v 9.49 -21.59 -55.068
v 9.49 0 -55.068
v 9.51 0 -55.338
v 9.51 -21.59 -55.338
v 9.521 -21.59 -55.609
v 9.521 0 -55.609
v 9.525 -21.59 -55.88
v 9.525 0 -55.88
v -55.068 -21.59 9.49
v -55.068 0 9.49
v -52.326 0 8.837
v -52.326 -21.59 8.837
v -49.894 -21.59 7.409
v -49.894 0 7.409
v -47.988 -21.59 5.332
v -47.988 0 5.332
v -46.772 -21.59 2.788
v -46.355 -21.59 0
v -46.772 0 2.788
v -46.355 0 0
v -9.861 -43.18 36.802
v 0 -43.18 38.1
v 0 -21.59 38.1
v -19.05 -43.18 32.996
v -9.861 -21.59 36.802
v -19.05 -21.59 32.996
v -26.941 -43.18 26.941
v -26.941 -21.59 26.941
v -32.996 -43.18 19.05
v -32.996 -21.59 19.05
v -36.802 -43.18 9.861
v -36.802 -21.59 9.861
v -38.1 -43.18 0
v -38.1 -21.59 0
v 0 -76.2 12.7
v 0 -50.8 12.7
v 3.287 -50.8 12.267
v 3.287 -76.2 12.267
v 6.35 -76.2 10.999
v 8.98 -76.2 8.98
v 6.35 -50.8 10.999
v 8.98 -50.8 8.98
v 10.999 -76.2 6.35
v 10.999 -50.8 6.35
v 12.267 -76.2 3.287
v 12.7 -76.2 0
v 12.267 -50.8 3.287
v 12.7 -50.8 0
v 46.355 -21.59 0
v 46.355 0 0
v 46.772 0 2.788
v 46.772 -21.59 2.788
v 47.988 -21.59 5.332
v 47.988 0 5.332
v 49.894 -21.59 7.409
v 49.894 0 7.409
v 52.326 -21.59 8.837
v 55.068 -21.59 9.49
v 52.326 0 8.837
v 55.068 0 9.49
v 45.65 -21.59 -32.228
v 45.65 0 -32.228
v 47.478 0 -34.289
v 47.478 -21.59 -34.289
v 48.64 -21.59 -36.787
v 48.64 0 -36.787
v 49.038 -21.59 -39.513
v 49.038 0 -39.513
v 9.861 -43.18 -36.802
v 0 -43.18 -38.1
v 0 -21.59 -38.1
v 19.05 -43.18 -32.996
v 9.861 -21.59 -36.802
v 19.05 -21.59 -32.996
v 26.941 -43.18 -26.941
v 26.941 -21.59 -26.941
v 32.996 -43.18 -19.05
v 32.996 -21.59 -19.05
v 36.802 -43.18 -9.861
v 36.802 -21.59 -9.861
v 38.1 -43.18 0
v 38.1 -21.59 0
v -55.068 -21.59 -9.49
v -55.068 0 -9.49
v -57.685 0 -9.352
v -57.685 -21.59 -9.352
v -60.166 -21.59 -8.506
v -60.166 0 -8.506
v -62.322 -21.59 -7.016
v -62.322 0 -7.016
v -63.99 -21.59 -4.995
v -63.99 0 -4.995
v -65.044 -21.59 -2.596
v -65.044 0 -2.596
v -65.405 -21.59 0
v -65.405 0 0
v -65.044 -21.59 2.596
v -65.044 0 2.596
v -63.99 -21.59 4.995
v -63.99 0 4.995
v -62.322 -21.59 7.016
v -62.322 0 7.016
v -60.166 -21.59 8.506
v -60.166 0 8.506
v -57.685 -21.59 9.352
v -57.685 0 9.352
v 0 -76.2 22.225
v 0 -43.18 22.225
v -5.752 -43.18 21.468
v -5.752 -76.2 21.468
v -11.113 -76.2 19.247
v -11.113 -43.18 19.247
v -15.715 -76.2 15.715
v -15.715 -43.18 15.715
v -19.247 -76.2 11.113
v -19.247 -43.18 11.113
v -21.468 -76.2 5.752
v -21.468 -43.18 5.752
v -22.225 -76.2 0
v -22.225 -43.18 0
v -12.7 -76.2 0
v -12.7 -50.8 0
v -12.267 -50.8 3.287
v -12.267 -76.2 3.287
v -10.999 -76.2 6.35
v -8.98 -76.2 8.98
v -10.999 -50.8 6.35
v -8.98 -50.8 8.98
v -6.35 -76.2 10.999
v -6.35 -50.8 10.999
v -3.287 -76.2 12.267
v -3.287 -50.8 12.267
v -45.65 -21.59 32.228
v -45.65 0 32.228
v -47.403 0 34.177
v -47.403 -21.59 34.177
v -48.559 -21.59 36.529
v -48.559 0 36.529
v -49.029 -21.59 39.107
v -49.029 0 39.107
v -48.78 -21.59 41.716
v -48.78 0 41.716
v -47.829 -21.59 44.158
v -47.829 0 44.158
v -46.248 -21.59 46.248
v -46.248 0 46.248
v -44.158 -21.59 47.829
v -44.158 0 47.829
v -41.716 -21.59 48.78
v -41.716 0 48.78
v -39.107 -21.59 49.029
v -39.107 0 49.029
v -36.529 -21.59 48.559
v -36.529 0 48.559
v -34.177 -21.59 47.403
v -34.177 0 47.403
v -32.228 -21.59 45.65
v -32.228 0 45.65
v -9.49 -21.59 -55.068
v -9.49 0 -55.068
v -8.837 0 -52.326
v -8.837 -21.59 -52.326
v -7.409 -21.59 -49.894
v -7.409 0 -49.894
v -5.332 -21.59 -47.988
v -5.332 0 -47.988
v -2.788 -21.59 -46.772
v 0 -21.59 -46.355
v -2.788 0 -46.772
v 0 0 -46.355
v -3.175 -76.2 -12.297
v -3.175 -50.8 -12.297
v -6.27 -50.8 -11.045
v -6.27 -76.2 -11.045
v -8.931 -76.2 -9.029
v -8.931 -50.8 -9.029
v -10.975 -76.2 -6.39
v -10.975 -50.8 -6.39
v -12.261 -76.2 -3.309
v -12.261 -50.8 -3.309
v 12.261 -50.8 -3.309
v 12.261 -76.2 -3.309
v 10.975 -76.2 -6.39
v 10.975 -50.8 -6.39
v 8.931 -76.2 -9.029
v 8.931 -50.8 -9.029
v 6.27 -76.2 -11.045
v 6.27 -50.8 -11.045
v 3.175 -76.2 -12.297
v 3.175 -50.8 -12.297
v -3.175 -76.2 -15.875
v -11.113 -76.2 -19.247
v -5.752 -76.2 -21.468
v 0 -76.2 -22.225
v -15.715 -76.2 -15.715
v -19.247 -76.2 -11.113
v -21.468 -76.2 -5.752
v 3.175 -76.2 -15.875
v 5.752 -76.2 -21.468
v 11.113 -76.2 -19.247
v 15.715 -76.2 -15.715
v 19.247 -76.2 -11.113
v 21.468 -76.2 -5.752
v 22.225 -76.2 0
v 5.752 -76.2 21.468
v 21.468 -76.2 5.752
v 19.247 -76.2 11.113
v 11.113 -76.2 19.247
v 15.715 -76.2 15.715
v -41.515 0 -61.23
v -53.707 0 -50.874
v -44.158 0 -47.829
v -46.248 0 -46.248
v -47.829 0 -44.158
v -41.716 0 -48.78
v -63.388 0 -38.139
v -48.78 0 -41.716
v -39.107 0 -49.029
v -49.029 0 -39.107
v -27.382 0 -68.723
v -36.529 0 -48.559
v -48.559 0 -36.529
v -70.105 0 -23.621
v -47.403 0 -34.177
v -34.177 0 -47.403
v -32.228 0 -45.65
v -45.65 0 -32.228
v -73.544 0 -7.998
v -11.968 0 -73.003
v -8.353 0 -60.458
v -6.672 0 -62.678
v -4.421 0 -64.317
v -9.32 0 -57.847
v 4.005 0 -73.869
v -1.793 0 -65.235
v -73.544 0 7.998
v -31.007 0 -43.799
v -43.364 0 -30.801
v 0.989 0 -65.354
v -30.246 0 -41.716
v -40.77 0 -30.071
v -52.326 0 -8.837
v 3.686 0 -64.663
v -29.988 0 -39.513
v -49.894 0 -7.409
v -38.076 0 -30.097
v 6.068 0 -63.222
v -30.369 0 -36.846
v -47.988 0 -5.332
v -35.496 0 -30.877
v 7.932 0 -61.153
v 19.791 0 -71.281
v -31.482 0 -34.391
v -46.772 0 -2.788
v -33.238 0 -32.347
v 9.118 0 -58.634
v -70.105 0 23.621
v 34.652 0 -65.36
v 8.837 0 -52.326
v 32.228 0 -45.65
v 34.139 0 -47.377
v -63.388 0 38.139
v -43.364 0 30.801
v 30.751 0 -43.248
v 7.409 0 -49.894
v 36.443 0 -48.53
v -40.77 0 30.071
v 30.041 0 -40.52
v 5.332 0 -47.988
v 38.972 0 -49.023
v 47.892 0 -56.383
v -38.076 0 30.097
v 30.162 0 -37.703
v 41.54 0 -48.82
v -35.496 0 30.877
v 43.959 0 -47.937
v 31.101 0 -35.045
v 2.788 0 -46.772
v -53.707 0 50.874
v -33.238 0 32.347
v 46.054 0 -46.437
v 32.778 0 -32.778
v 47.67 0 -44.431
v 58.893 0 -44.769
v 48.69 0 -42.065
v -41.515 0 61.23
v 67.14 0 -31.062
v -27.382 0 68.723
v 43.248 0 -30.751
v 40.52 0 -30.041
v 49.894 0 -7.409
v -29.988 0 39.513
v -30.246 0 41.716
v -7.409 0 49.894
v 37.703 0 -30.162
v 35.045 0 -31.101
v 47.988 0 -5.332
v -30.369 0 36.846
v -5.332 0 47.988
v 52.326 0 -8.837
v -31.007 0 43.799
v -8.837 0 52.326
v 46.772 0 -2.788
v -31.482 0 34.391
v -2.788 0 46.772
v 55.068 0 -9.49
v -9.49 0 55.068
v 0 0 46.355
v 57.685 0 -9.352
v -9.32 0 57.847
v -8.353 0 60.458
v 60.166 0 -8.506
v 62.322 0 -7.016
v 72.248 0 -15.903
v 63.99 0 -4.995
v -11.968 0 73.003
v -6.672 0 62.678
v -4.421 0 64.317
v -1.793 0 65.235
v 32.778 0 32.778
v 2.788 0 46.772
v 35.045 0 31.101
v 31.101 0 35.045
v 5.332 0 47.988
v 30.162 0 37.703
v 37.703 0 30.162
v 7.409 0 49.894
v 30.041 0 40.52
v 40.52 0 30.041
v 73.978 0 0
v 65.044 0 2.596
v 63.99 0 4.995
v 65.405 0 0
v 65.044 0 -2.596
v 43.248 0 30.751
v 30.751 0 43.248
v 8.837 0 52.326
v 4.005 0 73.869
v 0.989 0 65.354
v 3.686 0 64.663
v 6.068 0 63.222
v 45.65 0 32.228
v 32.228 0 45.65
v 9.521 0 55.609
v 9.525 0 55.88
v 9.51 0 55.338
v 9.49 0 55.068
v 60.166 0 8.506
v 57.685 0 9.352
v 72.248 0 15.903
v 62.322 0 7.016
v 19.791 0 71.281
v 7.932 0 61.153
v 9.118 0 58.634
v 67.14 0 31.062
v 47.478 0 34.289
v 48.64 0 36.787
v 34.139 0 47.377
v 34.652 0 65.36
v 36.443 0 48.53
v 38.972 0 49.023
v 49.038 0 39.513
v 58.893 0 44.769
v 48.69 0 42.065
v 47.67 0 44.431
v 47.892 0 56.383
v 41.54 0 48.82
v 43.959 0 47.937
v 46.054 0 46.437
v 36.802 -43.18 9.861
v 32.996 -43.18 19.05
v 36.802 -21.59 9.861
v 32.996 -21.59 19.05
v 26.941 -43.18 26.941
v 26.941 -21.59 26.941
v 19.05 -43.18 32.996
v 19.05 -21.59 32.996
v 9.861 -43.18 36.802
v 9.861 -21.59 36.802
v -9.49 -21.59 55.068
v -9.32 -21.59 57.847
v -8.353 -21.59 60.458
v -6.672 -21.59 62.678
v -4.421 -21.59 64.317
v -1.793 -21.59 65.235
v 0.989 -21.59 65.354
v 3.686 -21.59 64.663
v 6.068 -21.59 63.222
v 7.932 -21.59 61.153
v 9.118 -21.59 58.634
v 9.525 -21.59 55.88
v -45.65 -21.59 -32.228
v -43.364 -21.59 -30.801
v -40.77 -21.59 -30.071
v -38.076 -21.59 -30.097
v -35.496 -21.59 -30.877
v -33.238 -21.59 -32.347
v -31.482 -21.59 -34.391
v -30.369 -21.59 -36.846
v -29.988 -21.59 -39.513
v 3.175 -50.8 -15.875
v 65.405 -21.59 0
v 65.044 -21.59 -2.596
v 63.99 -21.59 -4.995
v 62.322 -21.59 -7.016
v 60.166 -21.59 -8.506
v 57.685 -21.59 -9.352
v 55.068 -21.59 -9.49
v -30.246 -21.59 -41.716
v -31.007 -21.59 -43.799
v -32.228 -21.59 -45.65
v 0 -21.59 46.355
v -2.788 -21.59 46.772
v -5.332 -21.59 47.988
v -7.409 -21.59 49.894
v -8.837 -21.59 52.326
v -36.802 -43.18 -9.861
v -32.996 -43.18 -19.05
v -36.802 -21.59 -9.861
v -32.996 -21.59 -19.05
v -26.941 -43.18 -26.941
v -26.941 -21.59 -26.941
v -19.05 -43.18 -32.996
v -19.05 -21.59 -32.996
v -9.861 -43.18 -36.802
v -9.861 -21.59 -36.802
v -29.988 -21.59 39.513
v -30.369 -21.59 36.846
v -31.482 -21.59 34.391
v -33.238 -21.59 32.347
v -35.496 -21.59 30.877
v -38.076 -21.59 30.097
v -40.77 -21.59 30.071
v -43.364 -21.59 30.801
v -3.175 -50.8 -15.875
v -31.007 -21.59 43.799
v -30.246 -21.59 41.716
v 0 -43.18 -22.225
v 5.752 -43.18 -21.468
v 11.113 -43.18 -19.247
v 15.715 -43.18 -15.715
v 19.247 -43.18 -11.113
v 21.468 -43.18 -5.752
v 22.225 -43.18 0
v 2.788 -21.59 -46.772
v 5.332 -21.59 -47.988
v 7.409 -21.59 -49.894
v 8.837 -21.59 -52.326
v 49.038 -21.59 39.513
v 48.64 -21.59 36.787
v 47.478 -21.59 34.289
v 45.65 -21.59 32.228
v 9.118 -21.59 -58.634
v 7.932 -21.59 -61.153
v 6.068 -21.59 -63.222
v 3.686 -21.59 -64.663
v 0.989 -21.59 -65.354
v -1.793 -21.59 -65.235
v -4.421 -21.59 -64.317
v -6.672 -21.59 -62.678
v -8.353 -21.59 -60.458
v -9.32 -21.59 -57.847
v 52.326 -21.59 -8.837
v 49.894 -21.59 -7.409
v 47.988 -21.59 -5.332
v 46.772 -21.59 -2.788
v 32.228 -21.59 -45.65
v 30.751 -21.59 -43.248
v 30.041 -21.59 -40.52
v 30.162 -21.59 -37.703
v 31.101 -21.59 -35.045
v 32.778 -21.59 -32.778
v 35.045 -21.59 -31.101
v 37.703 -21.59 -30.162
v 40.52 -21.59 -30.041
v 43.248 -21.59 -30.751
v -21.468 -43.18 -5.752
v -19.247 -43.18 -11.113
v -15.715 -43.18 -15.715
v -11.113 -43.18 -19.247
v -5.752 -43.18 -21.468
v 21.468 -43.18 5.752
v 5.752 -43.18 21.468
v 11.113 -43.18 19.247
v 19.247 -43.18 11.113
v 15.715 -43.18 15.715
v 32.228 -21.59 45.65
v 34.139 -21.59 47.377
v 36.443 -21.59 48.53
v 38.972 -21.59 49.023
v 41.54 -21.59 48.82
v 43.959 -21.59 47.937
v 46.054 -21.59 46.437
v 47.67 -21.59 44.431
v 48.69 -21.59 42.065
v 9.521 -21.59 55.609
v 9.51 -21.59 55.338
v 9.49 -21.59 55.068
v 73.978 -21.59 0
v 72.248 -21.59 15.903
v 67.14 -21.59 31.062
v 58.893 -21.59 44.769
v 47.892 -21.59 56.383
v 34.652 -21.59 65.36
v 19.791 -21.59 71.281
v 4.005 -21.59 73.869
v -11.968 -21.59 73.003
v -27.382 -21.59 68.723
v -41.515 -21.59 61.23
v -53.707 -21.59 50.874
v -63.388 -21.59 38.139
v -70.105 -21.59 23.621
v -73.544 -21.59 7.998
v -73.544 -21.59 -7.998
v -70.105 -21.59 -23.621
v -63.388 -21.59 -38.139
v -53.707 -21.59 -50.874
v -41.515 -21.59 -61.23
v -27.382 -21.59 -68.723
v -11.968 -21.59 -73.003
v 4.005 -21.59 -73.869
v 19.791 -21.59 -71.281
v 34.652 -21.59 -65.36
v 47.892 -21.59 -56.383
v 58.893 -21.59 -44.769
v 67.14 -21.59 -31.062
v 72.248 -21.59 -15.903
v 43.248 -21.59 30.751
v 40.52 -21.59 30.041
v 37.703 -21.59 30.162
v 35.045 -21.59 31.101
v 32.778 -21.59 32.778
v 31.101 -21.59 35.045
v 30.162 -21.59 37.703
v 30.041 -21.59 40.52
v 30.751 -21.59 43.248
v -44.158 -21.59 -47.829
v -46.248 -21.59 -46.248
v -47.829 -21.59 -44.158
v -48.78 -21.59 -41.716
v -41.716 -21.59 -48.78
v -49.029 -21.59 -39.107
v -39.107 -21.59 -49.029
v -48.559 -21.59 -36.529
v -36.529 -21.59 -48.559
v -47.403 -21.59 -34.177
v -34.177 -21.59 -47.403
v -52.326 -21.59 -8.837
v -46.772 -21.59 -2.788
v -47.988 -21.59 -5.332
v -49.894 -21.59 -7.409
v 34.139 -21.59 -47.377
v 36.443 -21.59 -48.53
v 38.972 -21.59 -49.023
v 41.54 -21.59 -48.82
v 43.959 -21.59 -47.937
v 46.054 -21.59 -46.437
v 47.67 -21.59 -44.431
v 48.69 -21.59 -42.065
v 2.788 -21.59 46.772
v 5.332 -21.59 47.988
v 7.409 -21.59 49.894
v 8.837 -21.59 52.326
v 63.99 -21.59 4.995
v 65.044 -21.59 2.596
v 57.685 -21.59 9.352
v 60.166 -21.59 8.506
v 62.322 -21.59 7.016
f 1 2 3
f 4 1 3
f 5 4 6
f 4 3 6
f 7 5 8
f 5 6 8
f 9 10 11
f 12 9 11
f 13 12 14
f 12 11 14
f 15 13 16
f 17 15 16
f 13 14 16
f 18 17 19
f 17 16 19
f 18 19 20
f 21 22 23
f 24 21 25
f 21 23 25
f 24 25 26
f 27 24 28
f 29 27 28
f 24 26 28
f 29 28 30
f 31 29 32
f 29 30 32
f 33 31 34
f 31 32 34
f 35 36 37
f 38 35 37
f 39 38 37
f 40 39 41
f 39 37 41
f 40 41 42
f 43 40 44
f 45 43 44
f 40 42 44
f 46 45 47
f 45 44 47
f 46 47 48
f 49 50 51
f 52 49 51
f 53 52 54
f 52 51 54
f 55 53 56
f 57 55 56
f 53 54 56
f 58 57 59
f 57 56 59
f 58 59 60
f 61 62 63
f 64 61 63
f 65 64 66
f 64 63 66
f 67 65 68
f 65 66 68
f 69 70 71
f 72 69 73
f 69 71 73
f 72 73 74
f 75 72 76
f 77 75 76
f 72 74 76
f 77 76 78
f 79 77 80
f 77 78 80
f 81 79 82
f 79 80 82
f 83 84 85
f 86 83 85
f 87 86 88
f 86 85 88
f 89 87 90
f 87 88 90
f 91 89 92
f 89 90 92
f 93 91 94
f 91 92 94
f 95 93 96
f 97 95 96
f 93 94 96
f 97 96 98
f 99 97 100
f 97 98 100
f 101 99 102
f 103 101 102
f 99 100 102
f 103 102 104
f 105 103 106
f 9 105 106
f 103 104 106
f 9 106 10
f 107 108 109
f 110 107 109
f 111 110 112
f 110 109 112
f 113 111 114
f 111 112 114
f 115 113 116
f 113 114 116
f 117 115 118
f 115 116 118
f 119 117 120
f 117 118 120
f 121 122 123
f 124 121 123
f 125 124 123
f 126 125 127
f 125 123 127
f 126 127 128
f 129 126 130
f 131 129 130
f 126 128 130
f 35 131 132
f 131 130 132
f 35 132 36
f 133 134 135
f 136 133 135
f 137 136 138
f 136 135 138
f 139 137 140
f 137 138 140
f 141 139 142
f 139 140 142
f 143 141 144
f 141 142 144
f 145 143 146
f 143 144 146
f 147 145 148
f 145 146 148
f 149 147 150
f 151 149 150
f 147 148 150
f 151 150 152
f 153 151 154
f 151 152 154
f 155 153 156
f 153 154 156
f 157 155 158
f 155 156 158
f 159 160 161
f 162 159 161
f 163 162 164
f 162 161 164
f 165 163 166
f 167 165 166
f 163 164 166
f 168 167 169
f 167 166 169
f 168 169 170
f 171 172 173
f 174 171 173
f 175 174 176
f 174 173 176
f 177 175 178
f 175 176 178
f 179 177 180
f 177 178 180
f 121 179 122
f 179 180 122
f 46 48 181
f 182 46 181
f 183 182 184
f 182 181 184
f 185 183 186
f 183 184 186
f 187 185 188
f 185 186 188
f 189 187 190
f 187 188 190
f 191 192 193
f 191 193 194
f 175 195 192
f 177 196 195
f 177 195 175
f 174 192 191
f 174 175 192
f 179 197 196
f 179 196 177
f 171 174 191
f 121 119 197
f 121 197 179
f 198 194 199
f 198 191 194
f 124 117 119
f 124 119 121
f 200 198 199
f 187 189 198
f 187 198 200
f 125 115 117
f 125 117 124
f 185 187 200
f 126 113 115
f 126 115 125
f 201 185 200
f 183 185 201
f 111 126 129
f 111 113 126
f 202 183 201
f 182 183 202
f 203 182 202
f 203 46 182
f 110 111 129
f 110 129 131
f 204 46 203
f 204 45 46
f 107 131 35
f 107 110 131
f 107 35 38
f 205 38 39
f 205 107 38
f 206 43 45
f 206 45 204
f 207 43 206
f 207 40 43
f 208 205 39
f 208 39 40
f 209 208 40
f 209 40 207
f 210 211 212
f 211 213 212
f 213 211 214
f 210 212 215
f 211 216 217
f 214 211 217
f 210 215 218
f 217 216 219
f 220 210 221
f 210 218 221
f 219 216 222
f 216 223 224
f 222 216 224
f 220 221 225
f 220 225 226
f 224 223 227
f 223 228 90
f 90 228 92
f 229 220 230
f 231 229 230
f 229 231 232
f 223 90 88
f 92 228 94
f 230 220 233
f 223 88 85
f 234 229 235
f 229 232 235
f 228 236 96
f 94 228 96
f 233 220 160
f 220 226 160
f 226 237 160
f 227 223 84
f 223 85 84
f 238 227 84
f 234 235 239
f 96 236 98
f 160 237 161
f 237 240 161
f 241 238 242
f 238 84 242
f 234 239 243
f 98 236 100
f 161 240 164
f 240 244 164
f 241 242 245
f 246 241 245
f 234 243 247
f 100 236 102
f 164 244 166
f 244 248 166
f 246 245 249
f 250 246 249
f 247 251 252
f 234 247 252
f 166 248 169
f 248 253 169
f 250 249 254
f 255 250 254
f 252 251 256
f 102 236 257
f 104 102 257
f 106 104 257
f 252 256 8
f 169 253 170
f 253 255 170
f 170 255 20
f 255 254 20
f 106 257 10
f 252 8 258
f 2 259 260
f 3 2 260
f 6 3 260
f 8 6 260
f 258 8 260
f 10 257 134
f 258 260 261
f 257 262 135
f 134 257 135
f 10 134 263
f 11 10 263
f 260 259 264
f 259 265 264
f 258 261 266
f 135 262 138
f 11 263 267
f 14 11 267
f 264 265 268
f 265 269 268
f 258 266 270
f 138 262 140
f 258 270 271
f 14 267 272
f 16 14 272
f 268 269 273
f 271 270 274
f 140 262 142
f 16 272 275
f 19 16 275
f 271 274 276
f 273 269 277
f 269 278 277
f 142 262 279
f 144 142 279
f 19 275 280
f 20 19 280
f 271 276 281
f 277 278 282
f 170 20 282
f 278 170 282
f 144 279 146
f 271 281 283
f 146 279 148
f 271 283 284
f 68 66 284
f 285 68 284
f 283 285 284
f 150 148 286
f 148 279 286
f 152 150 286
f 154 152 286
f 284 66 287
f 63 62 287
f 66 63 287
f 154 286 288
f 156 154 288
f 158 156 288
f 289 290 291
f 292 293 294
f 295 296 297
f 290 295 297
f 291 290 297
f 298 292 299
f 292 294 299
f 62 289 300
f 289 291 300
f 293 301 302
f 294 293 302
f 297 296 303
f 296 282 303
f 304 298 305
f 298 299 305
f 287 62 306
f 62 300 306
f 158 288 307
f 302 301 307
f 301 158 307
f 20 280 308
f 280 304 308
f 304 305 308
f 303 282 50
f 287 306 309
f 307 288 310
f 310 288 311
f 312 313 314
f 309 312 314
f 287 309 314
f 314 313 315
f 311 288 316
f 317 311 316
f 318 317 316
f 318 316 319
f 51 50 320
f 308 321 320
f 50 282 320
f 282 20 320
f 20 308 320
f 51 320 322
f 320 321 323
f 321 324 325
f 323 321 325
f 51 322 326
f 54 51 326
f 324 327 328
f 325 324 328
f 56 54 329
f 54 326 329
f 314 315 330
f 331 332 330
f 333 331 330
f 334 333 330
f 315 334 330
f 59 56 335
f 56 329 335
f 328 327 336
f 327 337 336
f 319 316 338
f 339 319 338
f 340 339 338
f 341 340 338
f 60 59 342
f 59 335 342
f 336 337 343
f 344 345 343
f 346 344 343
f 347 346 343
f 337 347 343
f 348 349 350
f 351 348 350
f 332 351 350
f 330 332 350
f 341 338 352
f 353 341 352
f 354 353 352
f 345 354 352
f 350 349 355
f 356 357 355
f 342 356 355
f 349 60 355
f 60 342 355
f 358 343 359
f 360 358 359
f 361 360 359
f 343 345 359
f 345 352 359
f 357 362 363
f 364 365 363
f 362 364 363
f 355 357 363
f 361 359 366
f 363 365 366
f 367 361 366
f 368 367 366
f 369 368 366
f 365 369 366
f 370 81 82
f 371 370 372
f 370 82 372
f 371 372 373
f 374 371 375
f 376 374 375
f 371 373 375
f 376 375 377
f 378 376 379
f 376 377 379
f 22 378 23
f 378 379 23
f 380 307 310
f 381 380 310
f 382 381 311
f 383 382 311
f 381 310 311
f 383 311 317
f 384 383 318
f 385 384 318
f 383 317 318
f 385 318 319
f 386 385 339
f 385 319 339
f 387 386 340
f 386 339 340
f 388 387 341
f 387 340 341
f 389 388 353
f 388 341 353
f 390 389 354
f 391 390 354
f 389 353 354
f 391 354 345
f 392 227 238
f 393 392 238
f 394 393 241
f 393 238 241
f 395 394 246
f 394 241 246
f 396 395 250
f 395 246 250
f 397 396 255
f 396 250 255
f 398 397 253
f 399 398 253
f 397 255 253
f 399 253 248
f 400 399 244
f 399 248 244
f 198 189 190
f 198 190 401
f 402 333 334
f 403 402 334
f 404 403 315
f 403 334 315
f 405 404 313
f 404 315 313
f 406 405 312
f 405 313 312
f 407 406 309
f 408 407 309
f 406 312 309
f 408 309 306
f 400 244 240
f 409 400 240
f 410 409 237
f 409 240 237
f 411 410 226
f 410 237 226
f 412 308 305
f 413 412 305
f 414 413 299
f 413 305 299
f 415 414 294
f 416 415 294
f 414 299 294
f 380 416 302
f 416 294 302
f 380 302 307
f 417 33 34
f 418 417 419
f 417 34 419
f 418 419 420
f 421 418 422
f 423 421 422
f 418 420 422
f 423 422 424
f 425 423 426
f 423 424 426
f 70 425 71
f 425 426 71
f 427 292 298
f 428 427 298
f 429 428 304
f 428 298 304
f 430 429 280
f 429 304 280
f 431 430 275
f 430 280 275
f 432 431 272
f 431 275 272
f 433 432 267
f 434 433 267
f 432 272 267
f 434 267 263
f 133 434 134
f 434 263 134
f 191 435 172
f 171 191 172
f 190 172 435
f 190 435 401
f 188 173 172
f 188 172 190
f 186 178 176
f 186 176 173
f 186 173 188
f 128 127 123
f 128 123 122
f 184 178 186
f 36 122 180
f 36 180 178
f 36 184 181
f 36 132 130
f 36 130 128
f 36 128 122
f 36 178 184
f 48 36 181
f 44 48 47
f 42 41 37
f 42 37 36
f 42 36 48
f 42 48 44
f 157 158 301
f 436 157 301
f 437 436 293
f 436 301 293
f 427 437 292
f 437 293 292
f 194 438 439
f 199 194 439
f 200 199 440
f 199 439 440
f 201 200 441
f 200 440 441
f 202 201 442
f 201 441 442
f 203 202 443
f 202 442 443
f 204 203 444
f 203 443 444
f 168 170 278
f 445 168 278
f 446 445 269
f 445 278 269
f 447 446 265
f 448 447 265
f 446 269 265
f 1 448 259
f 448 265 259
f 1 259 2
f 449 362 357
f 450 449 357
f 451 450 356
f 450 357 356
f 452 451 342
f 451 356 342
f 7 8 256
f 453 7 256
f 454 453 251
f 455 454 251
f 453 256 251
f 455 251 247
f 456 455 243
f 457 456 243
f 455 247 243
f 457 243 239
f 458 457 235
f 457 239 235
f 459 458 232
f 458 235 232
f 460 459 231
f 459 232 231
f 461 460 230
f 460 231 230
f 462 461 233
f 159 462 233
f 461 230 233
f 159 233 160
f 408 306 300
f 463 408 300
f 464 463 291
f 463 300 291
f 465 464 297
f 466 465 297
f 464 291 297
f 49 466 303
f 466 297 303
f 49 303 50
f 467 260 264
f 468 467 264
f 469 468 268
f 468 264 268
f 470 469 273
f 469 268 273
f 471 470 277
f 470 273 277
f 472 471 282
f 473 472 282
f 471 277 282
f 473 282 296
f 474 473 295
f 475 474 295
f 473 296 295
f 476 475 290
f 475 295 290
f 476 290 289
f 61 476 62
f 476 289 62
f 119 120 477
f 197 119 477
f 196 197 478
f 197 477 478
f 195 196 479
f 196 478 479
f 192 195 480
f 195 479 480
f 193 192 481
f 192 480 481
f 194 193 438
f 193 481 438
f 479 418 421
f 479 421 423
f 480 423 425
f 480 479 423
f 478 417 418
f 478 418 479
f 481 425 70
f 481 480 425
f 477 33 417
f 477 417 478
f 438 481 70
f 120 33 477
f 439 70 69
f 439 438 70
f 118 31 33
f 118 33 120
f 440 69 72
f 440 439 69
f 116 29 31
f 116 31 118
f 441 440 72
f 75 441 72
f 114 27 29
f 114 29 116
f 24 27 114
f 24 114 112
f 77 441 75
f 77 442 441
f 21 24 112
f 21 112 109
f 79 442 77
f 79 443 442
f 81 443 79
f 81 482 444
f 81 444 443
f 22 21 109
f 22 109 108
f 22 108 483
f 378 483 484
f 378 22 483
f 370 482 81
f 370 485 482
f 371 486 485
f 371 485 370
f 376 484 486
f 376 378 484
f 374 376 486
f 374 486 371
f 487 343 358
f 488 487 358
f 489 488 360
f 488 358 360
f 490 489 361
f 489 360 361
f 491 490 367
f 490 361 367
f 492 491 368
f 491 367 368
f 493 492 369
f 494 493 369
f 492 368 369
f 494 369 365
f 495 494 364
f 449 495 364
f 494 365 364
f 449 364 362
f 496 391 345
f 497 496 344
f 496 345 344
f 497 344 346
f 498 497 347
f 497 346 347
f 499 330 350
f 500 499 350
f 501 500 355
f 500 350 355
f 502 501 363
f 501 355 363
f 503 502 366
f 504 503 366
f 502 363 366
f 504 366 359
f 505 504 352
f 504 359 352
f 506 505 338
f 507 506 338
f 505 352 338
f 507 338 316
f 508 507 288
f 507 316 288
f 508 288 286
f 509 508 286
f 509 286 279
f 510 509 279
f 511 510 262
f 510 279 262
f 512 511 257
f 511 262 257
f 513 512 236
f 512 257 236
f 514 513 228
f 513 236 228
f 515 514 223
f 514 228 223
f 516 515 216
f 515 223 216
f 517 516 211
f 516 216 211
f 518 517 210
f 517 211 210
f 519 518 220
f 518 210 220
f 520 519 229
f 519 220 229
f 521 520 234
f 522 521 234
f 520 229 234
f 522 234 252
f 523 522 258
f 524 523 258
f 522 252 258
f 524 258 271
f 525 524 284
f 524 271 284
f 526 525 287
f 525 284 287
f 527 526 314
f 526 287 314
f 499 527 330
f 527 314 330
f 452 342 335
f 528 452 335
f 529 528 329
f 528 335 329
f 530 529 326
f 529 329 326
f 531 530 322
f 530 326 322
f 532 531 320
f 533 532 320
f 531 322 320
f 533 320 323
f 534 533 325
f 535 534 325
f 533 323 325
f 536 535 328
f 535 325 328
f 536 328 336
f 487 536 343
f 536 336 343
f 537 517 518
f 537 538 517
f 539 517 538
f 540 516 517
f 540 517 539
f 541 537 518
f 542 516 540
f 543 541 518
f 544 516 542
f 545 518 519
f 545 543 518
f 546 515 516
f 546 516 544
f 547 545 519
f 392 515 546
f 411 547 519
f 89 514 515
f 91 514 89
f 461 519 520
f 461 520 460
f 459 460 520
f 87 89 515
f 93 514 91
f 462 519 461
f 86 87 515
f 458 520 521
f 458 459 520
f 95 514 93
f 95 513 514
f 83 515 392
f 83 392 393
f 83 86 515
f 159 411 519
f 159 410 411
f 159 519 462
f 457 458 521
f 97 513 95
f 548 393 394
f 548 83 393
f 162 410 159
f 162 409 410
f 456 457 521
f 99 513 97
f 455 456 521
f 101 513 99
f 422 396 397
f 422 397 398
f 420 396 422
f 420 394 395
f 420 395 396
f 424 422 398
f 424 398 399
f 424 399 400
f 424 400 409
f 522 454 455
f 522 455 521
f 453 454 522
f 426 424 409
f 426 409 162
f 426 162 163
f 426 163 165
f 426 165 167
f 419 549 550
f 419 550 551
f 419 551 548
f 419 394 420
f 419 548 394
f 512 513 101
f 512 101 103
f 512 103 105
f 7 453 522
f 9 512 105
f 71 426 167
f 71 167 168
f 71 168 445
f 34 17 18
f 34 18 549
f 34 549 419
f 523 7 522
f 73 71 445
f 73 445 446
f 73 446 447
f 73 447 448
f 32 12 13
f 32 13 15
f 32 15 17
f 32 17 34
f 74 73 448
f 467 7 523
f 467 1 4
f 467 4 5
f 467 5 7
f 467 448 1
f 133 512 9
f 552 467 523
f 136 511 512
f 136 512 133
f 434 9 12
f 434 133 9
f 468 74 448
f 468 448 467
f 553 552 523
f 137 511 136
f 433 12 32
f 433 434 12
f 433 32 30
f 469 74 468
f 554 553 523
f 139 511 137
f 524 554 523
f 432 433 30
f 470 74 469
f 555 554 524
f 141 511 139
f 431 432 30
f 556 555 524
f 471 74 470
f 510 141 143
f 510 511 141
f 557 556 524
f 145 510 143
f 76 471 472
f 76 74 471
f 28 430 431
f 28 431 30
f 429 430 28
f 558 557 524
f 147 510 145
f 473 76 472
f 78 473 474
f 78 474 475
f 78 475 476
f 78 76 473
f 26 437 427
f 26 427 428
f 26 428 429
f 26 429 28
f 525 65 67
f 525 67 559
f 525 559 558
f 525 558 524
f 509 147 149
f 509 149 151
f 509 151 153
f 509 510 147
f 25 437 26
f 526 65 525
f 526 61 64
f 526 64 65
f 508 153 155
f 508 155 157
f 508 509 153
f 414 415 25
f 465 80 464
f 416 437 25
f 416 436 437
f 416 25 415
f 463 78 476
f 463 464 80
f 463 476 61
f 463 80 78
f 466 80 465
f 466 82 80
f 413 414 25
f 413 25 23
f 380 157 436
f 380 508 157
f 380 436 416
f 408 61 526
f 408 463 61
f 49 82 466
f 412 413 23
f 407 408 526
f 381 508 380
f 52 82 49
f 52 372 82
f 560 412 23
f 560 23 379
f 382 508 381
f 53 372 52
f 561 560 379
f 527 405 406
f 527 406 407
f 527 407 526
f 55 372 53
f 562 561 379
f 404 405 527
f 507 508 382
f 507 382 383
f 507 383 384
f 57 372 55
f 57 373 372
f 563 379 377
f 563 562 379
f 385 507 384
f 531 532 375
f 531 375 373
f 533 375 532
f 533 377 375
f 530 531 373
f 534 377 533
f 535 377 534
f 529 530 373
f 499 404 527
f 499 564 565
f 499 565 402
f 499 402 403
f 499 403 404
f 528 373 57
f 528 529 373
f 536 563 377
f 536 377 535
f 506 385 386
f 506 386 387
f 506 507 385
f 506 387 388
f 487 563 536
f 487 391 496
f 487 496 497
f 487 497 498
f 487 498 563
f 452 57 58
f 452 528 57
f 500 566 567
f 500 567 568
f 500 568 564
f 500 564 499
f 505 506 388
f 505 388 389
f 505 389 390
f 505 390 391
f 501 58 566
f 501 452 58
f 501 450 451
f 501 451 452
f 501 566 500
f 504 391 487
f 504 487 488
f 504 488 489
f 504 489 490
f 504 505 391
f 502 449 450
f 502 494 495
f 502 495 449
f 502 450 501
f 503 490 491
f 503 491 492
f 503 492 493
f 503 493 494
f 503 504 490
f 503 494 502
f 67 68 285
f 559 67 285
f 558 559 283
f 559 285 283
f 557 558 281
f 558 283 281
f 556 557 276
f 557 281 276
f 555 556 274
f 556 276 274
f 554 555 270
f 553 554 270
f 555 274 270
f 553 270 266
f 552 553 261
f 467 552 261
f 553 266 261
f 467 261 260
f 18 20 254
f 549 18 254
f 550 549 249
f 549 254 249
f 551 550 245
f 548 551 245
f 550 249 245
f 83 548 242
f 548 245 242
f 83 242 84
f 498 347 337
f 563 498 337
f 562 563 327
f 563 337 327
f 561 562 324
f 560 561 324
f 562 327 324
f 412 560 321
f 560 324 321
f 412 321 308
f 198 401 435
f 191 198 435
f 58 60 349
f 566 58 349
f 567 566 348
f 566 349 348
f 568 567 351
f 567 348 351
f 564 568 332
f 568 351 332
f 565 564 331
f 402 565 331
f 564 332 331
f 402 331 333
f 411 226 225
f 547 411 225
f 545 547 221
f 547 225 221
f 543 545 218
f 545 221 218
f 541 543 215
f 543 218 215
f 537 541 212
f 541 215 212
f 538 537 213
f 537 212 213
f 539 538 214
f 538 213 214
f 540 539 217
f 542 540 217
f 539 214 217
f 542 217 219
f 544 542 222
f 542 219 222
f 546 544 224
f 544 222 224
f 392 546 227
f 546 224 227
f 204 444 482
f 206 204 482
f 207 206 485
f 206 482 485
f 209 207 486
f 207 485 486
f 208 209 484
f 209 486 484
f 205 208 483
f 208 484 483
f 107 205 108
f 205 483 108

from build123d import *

# Parameters (mm, degrees)
F0_R     = 73.9775
F1_DEPTH = 21.59
F2_DEPTH = 43.18
F3_DEPTH = 76.2
F4_DEPTH = 50.8


with BuildPart() as f1:
    # F0 (on Front) → F1 (new body)
    with BuildSketch(Plane.XZ):
        Circle(F0_R)
        with BuildLine():
            ThreePointArc((45.6497912216, 32.2284185374), (51.6263882767, 21.3843502006), (55.0682102273, 9.4903436379))
            ThreePointArc((55.0682102273, 9.4903436379), (62.3217904116, 7.0163353179), (65.405, 0))
            ThreePointArc((65.405, 0), (62.3217904116, -7.0163353179), (55.0682102273, -9.4903436379))
            ThreePointArc((55.0682102273, -9.4903436379), (51.6263882767, -21.3843502006), (45.6497912216, -32.2284185374))
            ThreePointArc((45.6497912216, -32.2284185374), (48.1496005288, -35.4960448046), (49.0381269327, -39.5131269327))
            ThreePointArc((49.0381269327, -39.5131269327), (42.7795299647, -48.4605419914), (32.2284185374, -45.6497912216))
            ThreePointArc((32.2284185374, -45.6497912216), (21.3843502006, -51.6263882767), (9.4903436379, -55.0682102273))
            ThreePointArc((9.4903436379, -55.0682102273), (9.5163319654, -55.4737354007), (9.525, -55.88))
            ThreePointArc((9.525, -55.88), (-0.4062645993, -65.3963319654), (-9.4903436379, -55.0682102273))
            ThreePointArc((-9.4903436379, -55.0682102273), (-21.3843502006, -51.6263882767), (-32.2284185374, -45.6497912216))
            ThreePointArc((-32.2284185374, -45.6497912216), (-46.2483190235, -46.2483190235), (-45.6497912216, -32.2284185374))
            ThreePointArc((-45.6497912216, -32.2284185374), (-51.6263882767, -21.3843502006), (-55.0682102273, -9.4903436379))
            ThreePointArc((-55.0682102273, -9.4903436379), (-65.405, 0), (-55.0682102273, 9.4903436379))
            ThreePointArc((-55.0682102273, 9.4903436379), (-51.6263882767, 21.3843502006), (-45.6497912216, 32.2284185374))
            ThreePointArc((-45.6497912216, 32.2284185374), (-46.2483190235, 46.2483190235), (-32.2284185374, 45.6497912216))
            ThreePointArc((-32.2284185374, 45.6497912216), (-21.3843502006, 51.6263882767), (-9.4903436379, 55.0682102273))
            ThreePointArc((-9.4903436379, 55.0682102273), (-0.4062645993, 65.3963319654), (9.525, 55.88))
            ThreePointArc((9.525, 55.88), (9.5163319654, 55.4737354007), (9.4903436379, 55.0682102273))
            ThreePointArc((9.4903436379, 55.0682102273), (21.3843502006, 51.6263882767), (32.2284185374, 45.6497912216))
            ThreePointArc((32.2284185374, 45.6497912216), (42.7795299647, 48.4605419914), (49.0381269327, 39.5131269327))
            ThreePointArc((49.0381269327, 39.5131269327), (48.1496005288, 35.4960448046), (45.6497912216, 32.2284185374))
        make_face(mode=Mode.SUBTRACT)
        with BuildLine():
            ThreePointArc((0, 38.1), (26.9407683632, 26.9407683632), (38.1, 0))
            Line((38.1, 0), (46.355, 0))
            ThreePointArc((46.355, 0), (48.8636646821, 6.4417904116), (55.0682102273, 9.4903436379))
            ThreePointArc((55.0682102273, 9.4903436379), (51.6263882767, 21.3843502006), (45.6497912216, 32.2284185374))
            ThreePointArc((45.6497912216, 32.2284185374), (32.7779348419, 32.7779348419), (32.2284185374, 45.6497912216))
            ThreePointArc((32.2284185374, 45.6497912216), (21.3843502006, 51.6263882767), (9.4903436379, 55.0682102273))
            ThreePointArc((9.4903436379, 55.0682102273), (6.4417904116, 48.8636646821), (0, 46.355))
            Line((0, 46.355), (0, 38.1))
        make_face()
        with BuildLine():
            ThreePointArc((-38.1, 0), (-26.9407683632, 26.9407683632), (0, 38.1))
            Line((0, 38.1), (0, 46.355))
            ThreePointArc((0, 46.355), (-6.4417904116, 48.8636646821), (-9.4903436379, 55.0682102273))
            ThreePointArc((-9.4903436379, 55.0682102273), (-21.3843502006, 51.6263882767), (-32.2284185374, 45.6497912216))
            ThreePointArc((-32.2284185374, 45.6497912216), (-30.565711874, 42.7795299647), (-29.9881269327, 39.5131269327))
            ThreePointArc((-29.9881269327, 39.5131269327), (-35.4960448046, 30.8766533366), (-45.6497912216, 32.2284185374))
            ThreePointArc((-45.6497912216, 32.2284185374), (-51.6263882767, 21.3843502006), (-55.0682102273, 9.4903436379))
            ThreePointArc((-55.0682102273, 9.4903436379), (-48.8636646821, 6.4417904116), (-46.355, 0))
            Line((-46.355, 0), (-38.1, 0))
        make_face()
        with BuildLine():
            Line((0, -46.355), (0, -38.1))
            ThreePointArc((0, -38.1), (-26.9407683632, -26.9407683632), (-38.1, 0))
            Line((-38.1, 0), (-46.355, 0))
            ThreePointArc((-46.355, 0), (-48.8636646821, -6.4417904116), (-55.0682102273, -9.4903436379))
            ThreePointArc((-55.0682102273, -9.4903436379), (-51.6263882767, -21.3843502006), (-45.6497912216, -32.2284185374))
            ThreePointArc((-45.6497912216, -32.2284185374), (-35.4960448046, -30.8766533366), (-29.9881269327, -39.5131269327))
            ThreePointArc((-29.9881269327, -39.5131269327), (-30.565711874, -42.7795299647), (-32.2284185374, -45.6497912216))
            ThreePointArc((-32.2284185374, -45.6497912216), (-21.3843502006, -51.6263882767), (-9.4903436379, -55.0682102273))
            ThreePointArc((-9.4903436379, -55.0682102273), (-6.4417904116, -48.8636646821), (0, -46.355))
        make_face()
        with BuildLine():
            Line((46.355, 0), (38.1, 0))
            ThreePointArc((38.1, 0), (26.9407683632, -26.9407683632), (0, -38.1))
            Line((0, -38.1), (0, -46.355))
            ThreePointArc((0, -46.355), (6.4417904116, -48.8636646821), (9.4903436379, -55.0682102273))
            ThreePointArc((9.4903436379, -55.0682102273), (21.3843502006, -51.6263882767), (32.2284185374, -45.6497912216))
            ThreePointArc((32.2284185374, -45.6497912216), (32.7779348419, -32.7779348419), (45.6497912216, -32.2284185374))
            ThreePointArc((45.6497912216, -32.2284185374), (51.6263882767, -21.3843502006), (55.0682102273, -9.4903436379))
            ThreePointArc((55.0682102273, -9.4903436379), (48.8636646821, -6.4417904116), (46.355, 0))
        make_face()
    extrude(amount=F1_DEPTH)

    # F0 (on Front) → F2 (join)
    with BuildSketch(Plane.XZ):
        with BuildLine():
            ThreePointArc((-22.225, 0), (-15.7154482119, 15.7154482119), (0, 22.225))
            Line((0, 22.225), (0, 38.1))
            ThreePointArc((0, 38.1), (-26.9407683632, 26.9407683632), (-38.1, 0))
            Line((-38.1, 0), (-22.225, 0))
        make_face()
        with BuildLine():
            Line((0, -38.1), (0, -22.225))
            ThreePointArc((0, -22.225), (-15.7154482119, -15.7154482119), (-22.225, 0))
            Line((-22.225, 0), (-38.1, 0))
            ThreePointArc((-38.1, 0), (-26.9407683632, -26.9407683632), (0, -38.1))
        make_face()
        with BuildLine():
            Line((38.1, 0), (22.225, 0))
            ThreePointArc((22.225, 0), (15.7154482119, -15.7154482119), (0, -22.225))
            Line((0, -22.225), (0, -38.1))
            ThreePointArc((0, -38.1), (26.9407683632, -26.9407683632), (38.1, 0))
        make_face()
        with BuildLine():
            ThreePointArc((0, 22.225), (15.7154482119, 15.7154482119), (22.225, 0))
            Line((22.225, 0), (38.1, 0))
            ThreePointArc((38.1, 0), (26.9407683632, 26.9407683632), (0, 38.1))
            Line((0, 38.1), (0, 22.225))
        make_face()
    extrude(amount=F2_DEPTH)

    # F0 (on Front) → F3 (join)
    with BuildSketch(Plane.XZ):
        with BuildLine():
            ThreePointArc((-12.7, 0), (-8.9802561211, 8.9802561211), (0, 12.7))
            Line((0, 12.7), (0, 22.225))
            ThreePointArc((0, 22.225), (-15.7154482119, 15.7154482119), (-22.225, 0))
            Line((-22.225, 0), (-12.7, 0))
        make_face()
        with BuildLine():
            ThreePointArc((0, 12.7), (8.9802561211, 8.9802561211), (12.7, 0))
            Line((12.7, 0), (22.225, 0))
            ThreePointArc((22.225, 0), (15.7154482119, 15.7154482119), (0, 22.225))
            Line((0, 22.225), (0, 12.7))
        make_face()
        with BuildLine():
            Line((22.225, 0), (12.7, 0))
            ThreePointArc((12.7, 0), (10.040231571, -7.7771299333), (3.175, -12.2967221242))
            Line((3.175, -12.2967221242), (3.175, -15.875))
            Line((3.175, -15.875), (0, -15.875))
            Line((0, -15.875), (0, -22.225))
            ThreePointArc((0, -22.225), (15.7154482119, -15.7154482119), (22.225, 0))
        make_face()
        with BuildLine():
            ThreePointArc((-3.175, -12.2967221242), (-10.040231571, -7.7771299333), (-12.7, 0))
            Line((-12.7, 0), (-22.225, 0))
            ThreePointArc((-22.225, 0), (-15.7154482119, -15.7154482119), (0, -22.225))
            Line((0, -22.225), (0, -15.875))
            Line((0, -15.875), (-3.175, -15.875))
            Line((-3.175, -15.875), (-3.175, -12.2967221242))
        make_face()
    extrude(amount=F3_DEPTH)

    # F0 (on Front) → F4 (join)
    with BuildSketch(Plane.XZ):
        with BuildLine():
            ThreePointArc((3.175, -12.2967221242), (10.040231571, -7.7771299333), (12.7, 0))
            Line((12.7, 0), (0, 0))
            Line((0, 0), (0, -9.525))
            Line((0, -9.525), (3.175, -9.525))
            Line((3.175, -9.525), (3.175, -12.2967221242))
        make_face()
        with BuildLine():
            Line((0, -9.525), (0, 0))
            Line((0, 0), (-12.7, 0))
            ThreePointArc((-12.7, 0), (-10.040231571, -7.7771299333), (-3.175, -12.2967221242))
            Line((-3.175, -12.2967221242), (-3.175, -9.525))
            Line((-3.175, -9.525), (0, -9.525))
        make_face()
        with BuildLine():
            Line((0, 0), (0, 12.7))
            ThreePointArc((0, 12.7), (-8.9802561211, 8.9802561211), (-12.7, 0))
            Line((-12.7, 0), (0, 0))
        make_face()
        with BuildLine():
            Line((0, 0), (12.7, 0))
            ThreePointArc((12.7, 0), (8.9802561211, 8.9802561211), (0, 12.7))
            Line((0, 12.7), (0, 0))
        make_face()
        with BuildLine():
            Line((0, -15.875), (0, -12.7))
            ThreePointArc((0, -12.7), (-1.6002545145, -12.5987771426), (-3.175, -12.2967221242))
            Line((-3.175, -12.2967221242), (-3.175, -15.875))
            Line((-3.175, -15.875), (0, -15.875))
        make_face()
        with BuildLine():
            ThreePointArc((0, -12.7), (1.6002545145, -12.5987771426), (3.175, -12.2967221242))
            Line((3.175, -12.2967221242), (3.175, -9.525))
            Line((3.175, -9.525), (0, -9.525))
            Line((0, -9.525), (0, -12.7))
        make_face()
        with BuildLine():
            Line((3.175, -15.875), (3.175, -12.2967221242))
            ThreePointArc((3.175, -12.2967221242), (1.6002545145, -12.5987771426), (0, -12.7))
            Line((0, -12.7), (0, -15.875))
            Line((0, -15.875), (3.175, -15.875))
        make_face()
        with BuildLine():
            ThreePointArc((-3.175, -12.2967221242), (-1.6002545145, -12.5987771426), (0, -12.7))
            Line((0, -12.7), (0, -9.525))
            Line((0, -9.525), (-3.175, -9.525))
            Line((-3.175, -9.525), (-3.175, -12.2967221242))
        make_face()
    extrude(amount=F4_DEPTH)


solid = f1.part
